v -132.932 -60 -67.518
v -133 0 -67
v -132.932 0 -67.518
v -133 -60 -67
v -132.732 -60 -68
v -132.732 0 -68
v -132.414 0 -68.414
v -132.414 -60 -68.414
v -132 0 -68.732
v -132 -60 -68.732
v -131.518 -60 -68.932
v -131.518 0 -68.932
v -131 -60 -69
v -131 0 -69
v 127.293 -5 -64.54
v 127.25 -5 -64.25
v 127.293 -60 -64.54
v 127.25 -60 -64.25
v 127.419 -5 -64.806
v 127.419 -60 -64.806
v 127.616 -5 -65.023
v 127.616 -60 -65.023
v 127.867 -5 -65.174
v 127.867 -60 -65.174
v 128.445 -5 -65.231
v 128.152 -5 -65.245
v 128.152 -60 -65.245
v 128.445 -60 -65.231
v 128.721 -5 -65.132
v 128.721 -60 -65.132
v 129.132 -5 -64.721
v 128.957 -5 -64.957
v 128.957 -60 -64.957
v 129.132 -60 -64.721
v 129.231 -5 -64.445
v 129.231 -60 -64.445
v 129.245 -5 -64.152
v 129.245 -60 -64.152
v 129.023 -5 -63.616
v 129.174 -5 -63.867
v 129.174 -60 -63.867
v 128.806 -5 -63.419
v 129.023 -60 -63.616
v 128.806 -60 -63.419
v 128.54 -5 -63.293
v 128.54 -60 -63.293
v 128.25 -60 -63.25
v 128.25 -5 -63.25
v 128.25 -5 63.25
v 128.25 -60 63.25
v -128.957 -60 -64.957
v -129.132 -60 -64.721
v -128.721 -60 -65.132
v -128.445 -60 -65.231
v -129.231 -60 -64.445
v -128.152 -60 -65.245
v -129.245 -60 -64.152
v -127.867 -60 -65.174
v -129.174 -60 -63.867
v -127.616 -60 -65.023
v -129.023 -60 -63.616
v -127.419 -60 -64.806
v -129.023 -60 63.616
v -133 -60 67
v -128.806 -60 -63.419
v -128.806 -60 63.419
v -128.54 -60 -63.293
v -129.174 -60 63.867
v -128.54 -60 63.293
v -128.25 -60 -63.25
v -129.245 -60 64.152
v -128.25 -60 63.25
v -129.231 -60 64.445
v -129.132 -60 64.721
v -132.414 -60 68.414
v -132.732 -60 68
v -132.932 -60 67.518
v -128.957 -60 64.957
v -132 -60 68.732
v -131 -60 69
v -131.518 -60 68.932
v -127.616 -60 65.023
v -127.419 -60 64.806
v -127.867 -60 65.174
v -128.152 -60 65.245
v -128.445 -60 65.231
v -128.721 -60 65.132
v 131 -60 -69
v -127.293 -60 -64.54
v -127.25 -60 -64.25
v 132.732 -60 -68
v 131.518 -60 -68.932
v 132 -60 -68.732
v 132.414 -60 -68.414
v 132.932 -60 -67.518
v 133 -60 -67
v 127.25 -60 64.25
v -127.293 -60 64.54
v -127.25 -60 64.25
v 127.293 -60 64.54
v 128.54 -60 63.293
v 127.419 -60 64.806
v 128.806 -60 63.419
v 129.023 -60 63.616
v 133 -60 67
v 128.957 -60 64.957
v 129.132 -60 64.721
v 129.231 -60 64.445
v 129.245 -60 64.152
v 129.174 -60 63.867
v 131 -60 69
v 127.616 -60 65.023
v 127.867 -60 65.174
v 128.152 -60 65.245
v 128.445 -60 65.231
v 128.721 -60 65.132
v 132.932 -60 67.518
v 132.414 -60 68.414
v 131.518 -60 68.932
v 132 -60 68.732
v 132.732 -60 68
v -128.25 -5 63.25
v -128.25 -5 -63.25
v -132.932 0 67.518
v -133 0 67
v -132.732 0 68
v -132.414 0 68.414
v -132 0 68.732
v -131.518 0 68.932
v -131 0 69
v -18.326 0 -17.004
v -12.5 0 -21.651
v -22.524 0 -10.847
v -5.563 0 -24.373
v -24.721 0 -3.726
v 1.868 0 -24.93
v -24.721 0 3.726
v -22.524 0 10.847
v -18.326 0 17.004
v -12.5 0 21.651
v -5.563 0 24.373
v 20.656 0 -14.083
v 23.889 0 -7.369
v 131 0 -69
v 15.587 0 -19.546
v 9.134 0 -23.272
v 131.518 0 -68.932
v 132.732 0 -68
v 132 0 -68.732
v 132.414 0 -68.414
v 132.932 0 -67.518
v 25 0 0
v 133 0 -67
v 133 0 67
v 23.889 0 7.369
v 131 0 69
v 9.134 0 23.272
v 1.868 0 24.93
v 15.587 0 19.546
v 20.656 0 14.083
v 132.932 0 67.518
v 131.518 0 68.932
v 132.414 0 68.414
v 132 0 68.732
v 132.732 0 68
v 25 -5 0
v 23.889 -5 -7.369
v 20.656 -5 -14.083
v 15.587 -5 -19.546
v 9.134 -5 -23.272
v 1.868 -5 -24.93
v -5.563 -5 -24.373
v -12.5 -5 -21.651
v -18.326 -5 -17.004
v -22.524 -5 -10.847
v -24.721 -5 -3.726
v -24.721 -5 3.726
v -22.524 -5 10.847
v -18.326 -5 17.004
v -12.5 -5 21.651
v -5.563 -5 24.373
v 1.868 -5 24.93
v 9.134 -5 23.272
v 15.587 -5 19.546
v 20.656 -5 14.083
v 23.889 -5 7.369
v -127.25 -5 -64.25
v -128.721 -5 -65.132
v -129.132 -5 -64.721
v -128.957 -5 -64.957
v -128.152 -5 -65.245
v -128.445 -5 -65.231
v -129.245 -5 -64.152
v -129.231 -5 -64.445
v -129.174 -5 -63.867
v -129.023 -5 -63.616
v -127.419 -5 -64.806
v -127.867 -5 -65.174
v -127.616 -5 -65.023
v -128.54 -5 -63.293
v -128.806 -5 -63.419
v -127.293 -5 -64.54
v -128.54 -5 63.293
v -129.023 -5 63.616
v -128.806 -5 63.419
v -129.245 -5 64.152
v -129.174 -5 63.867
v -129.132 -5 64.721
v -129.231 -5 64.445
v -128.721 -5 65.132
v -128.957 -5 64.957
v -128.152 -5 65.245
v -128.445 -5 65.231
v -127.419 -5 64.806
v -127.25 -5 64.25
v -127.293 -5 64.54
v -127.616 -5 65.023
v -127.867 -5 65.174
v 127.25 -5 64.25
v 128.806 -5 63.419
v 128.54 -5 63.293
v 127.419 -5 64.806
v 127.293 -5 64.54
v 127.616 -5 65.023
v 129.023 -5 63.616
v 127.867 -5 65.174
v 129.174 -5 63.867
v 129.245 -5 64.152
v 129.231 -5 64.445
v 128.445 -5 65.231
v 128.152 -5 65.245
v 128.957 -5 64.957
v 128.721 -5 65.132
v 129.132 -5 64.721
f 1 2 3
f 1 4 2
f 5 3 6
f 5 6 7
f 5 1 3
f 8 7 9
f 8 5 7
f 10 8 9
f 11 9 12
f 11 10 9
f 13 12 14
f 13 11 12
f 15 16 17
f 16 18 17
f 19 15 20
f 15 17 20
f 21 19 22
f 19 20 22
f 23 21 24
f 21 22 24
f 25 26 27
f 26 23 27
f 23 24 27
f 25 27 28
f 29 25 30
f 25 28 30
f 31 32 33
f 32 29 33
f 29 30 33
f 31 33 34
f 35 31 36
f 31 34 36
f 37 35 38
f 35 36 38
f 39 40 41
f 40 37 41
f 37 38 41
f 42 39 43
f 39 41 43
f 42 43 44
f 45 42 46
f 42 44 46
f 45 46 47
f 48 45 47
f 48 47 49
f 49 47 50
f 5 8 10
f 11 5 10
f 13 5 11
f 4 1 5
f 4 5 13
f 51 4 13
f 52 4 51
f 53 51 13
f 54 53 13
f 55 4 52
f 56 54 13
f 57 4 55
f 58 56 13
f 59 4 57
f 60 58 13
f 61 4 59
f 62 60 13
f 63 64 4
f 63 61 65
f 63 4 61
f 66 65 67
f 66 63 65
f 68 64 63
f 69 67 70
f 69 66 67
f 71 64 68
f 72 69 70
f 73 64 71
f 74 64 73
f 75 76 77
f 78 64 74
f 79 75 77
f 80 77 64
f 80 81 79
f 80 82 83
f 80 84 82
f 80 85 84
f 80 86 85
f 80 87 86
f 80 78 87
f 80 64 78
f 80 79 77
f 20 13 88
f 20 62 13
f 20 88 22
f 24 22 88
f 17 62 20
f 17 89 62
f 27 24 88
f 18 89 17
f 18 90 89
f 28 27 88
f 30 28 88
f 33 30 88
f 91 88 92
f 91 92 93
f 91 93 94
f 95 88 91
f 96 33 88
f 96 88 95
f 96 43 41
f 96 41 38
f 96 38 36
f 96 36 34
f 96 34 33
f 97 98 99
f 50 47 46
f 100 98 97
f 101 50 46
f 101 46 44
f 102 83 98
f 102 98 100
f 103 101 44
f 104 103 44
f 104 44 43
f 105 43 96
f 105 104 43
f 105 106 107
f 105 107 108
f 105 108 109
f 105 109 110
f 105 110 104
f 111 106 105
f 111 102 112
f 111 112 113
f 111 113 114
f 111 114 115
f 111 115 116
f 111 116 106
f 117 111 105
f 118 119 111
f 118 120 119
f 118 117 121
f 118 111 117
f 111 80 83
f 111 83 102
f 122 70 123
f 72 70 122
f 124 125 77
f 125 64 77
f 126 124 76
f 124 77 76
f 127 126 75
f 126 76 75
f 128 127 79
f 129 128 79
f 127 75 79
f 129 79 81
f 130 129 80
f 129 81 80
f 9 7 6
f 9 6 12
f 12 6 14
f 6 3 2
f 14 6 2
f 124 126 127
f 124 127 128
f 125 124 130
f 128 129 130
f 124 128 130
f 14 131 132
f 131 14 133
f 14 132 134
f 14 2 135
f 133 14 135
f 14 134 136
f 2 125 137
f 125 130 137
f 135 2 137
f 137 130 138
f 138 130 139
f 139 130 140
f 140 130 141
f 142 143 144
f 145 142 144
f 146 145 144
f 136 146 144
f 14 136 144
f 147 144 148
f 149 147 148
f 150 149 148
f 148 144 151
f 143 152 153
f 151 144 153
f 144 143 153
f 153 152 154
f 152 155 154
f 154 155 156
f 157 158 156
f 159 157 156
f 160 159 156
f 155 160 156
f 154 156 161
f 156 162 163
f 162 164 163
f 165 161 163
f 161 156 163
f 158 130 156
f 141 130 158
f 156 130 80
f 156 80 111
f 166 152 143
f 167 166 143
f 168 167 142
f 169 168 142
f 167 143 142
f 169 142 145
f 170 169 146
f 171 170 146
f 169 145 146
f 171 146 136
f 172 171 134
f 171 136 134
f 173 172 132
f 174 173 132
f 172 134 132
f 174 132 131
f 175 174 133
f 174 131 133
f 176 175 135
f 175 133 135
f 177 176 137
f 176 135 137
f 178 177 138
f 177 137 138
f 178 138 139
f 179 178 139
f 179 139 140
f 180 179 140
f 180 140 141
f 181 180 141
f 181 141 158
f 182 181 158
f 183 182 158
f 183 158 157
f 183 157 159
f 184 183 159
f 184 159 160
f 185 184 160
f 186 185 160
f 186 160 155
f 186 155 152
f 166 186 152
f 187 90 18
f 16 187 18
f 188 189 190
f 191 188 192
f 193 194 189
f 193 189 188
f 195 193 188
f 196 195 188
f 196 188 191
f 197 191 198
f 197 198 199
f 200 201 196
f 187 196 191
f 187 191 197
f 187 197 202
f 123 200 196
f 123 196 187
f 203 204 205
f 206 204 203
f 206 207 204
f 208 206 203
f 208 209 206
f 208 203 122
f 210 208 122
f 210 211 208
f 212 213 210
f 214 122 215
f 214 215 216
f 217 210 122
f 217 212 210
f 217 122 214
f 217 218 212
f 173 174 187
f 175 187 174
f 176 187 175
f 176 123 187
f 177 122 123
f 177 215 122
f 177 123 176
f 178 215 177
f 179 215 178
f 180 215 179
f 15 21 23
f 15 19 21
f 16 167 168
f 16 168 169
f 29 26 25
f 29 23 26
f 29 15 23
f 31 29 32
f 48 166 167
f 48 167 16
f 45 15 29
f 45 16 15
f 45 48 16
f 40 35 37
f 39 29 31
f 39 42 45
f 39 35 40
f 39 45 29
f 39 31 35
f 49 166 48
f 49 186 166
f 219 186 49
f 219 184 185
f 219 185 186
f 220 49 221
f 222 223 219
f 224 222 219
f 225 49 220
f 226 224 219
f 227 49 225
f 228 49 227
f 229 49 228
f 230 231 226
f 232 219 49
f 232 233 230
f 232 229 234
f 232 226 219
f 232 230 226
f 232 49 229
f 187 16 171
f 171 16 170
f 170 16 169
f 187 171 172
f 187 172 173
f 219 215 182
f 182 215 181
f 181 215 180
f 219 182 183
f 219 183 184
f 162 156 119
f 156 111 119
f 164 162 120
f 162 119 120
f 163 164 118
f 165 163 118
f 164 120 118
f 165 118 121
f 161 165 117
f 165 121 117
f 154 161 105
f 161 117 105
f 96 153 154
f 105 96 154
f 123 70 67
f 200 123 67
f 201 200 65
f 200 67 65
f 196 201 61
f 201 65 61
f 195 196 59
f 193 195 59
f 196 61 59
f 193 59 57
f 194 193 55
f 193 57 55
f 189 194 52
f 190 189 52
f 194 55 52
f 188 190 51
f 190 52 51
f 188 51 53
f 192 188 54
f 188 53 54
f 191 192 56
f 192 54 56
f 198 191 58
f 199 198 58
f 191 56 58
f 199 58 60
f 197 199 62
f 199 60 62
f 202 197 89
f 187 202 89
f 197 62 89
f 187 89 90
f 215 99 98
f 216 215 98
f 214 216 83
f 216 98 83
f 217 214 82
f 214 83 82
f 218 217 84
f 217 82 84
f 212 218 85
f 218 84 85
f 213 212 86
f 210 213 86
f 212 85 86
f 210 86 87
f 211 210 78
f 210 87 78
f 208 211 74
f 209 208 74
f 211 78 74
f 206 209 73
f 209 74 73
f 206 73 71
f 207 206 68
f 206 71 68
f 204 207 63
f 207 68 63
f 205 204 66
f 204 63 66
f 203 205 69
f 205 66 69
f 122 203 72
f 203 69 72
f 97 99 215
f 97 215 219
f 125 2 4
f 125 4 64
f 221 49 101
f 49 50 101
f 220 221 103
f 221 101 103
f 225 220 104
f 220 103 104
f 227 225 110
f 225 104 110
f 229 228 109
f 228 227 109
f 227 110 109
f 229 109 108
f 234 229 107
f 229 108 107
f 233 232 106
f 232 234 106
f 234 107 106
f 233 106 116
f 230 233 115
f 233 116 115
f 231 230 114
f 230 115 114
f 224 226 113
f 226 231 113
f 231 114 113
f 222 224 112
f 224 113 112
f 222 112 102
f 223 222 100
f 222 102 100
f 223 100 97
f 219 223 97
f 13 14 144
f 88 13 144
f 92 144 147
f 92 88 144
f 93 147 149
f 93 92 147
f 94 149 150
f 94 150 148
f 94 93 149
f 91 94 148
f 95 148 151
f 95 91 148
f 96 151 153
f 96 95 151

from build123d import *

# Parameters (mm, degrees)
SKETCH_W        = 266
SKETCH_H        = 138
PAD_DEPTH       = 60
SKETCH001_W     = 256.5
SKETCH001_H     = 128.5
POCKET_DEPTH    = 55
FILLET_R        = 2
SKETCH002_R     = 25
POCKET001_DEPTH = 60.001
SKETCH003_R     = 1
POCKET002_DEPTH = 55


with BuildPart() as part:
    # Sketch → Pad (new body)
    with BuildSketch(Plane.XZ):
        Rectangle(SKETCH_W, SKETCH_H)
    extrude(amount=PAD_DEPTH)

    # Sketch001 (on Face6 of Pad) → Pocket (cut)
    with BuildSketch(Plane.XZ.offset(60)):
        Rectangle(SKETCH001_W, SKETCH001_H)
    extrude(amount=-POCKET_DEPTH, mode=Mode.SUBTRACT)

    # Fillet
    fillet_edges = [part.edges().sort_by_distance(p)[0] for p in [
        (-133, -30, 69),
        (133, -30, 69),
        (-133, -30, -69),
        (133, -30, -69),
    ]]
    fillet(fillet_edges, radius=FILLET_R)

    # Sketch002 (on Face2 of Fillet) → Pocket001 (cut, through all)
    with BuildSketch(Plane(origin=(0, 0, 0), x_dir=(1, 0, 0), z_dir=(0, 1, 0))):
        Circle(SKETCH002_R)
    extrude(amount=-POCKET001_DEPTH, mode=Mode.SUBTRACT)

    # Sketch003 (on Face5 of Pocket) → Pocket002 (cut)
    with BuildSketch(Plane.XZ.offset(60)):
        with Locations((-128.25, 64.25)):
            Circle(SKETCH003_R)
        with Locations((128.25, 64.25)):
            Circle(SKETCH003_R)
        with Locations((128.25, -64.25)):
            Circle(SKETCH003_R)
        with Locations((-128.25, -64.25)):
            Circle(SKETCH003_R)
    extrude(amount=-POCKET002_DEPTH, mode=Mode.SUBTRACT)


solid = part.part
